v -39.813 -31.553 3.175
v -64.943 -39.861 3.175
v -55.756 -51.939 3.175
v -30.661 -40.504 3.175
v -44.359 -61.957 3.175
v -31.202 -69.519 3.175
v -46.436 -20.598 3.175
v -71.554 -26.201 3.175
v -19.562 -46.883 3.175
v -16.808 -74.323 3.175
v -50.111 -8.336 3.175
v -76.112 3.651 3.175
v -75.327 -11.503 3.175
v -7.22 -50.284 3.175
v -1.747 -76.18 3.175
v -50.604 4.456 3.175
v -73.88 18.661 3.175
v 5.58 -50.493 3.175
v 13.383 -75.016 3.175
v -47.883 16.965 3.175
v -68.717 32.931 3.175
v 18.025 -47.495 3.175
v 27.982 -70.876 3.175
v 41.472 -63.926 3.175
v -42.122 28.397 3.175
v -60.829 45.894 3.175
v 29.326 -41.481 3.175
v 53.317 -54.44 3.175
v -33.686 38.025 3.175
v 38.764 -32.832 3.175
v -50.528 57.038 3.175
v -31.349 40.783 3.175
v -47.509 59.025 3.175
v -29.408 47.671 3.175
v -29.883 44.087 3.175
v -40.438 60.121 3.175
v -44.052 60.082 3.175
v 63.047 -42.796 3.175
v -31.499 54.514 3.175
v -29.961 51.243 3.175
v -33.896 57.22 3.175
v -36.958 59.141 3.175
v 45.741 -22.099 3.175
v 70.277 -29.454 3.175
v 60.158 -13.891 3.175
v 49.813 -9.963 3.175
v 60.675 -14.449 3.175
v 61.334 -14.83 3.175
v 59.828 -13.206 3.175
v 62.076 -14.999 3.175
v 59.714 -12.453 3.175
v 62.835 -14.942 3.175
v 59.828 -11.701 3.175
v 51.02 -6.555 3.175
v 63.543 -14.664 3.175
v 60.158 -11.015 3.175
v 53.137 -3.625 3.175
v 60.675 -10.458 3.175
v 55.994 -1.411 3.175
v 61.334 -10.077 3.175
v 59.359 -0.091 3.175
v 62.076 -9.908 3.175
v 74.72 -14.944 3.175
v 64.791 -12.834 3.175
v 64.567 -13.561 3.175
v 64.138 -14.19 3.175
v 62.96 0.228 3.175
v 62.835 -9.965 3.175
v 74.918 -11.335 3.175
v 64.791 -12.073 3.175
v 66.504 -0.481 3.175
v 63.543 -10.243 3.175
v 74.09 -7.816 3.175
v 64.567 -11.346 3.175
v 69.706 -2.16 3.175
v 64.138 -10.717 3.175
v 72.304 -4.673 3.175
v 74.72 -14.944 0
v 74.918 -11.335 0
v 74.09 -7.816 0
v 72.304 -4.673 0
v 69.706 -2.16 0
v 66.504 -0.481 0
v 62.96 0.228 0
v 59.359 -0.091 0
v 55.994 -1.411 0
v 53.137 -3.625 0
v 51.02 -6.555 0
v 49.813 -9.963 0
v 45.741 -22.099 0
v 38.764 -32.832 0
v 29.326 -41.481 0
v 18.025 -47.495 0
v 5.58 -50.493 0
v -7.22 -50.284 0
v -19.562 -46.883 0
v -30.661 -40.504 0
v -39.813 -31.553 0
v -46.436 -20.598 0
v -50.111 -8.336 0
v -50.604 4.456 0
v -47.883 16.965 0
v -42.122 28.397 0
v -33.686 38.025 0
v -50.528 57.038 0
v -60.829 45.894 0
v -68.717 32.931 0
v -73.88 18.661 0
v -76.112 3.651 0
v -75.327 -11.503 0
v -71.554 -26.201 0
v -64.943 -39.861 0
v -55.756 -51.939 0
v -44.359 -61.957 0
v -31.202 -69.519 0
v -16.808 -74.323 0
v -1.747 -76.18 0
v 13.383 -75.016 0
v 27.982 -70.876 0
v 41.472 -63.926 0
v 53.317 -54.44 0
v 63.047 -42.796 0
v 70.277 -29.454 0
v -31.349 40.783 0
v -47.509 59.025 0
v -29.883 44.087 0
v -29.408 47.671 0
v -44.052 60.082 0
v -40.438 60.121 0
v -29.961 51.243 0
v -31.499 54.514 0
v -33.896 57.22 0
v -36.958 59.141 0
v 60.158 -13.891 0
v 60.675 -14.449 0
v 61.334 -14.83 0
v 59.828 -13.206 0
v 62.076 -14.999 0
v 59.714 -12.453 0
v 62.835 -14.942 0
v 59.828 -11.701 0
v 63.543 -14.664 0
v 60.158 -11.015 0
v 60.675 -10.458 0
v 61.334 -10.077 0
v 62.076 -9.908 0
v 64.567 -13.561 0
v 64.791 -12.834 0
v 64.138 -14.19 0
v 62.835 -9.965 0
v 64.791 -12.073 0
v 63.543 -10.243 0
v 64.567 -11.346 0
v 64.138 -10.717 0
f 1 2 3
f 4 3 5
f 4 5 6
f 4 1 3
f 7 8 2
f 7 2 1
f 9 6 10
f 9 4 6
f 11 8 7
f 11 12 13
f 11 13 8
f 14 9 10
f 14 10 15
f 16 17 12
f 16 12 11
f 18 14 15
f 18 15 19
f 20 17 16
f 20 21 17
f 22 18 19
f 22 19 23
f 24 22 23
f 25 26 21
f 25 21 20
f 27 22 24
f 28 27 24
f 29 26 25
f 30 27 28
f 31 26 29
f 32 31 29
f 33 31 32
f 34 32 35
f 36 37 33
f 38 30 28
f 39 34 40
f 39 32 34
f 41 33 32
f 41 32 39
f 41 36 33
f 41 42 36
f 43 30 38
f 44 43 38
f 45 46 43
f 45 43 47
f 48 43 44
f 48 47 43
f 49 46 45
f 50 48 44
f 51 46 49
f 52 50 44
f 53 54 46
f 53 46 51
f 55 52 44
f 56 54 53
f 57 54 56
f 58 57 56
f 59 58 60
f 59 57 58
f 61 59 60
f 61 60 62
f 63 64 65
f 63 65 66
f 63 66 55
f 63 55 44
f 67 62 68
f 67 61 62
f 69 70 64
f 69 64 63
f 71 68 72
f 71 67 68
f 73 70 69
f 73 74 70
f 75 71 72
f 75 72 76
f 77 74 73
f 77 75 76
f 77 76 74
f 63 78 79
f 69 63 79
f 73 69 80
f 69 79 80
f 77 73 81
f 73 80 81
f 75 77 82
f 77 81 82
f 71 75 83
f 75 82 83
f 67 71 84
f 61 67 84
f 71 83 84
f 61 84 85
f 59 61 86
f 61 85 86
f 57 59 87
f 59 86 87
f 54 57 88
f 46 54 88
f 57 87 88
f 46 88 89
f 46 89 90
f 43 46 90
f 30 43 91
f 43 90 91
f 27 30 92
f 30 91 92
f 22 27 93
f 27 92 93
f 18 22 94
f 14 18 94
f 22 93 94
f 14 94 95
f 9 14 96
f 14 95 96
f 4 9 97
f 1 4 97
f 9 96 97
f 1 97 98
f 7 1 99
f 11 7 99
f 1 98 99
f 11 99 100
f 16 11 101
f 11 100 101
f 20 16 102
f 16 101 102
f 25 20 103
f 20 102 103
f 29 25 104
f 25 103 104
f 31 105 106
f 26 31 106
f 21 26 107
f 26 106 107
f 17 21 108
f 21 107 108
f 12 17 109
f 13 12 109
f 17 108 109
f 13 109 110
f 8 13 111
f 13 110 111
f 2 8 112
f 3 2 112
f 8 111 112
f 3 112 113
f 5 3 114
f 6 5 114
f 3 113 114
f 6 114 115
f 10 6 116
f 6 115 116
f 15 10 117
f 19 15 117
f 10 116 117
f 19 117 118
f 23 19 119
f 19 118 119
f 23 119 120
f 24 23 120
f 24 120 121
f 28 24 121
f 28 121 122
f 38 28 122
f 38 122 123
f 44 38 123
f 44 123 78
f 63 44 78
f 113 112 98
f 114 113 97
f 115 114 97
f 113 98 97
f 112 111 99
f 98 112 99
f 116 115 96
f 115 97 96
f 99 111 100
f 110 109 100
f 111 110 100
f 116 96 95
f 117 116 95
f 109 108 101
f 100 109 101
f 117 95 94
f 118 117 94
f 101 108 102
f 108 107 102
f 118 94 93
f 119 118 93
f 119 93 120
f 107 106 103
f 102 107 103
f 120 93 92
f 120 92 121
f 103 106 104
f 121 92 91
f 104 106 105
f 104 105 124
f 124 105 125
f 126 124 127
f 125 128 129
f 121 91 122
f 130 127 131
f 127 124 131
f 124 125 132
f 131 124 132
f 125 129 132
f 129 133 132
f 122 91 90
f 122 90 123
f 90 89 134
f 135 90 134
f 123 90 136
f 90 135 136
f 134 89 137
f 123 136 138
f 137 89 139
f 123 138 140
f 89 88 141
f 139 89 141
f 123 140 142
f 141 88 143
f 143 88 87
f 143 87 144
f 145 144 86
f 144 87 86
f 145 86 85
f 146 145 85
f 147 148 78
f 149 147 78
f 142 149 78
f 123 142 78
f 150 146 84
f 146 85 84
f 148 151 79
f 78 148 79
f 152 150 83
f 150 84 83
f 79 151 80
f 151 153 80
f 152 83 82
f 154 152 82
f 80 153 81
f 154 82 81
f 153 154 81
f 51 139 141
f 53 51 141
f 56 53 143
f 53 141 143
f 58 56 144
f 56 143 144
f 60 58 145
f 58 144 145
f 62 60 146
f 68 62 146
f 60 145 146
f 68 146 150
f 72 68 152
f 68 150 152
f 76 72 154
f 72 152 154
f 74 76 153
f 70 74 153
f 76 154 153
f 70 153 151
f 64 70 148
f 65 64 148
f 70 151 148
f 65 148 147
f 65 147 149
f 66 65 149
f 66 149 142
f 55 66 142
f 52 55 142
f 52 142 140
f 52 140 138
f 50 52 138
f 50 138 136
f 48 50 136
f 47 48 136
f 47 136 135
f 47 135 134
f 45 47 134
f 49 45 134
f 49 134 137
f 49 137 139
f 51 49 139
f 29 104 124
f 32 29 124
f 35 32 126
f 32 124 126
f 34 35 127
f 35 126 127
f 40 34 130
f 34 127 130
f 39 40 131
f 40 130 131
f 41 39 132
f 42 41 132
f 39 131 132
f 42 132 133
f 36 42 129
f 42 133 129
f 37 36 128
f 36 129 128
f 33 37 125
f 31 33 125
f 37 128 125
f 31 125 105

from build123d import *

# Parameters (mm, degrees)
BOSS_EXTRUDE1_DEPTH     = 3.175
F_1_4_20_TAPPED_HOLE1_D = 5.1054


with BuildPart() as part:
    # Sketch1 → Boss-Extrude1 (new body)
    with BuildSketch(Plane.XY):
        with BuildLine():
            ThreePointArc((-50.528450834, 57.037844072), (-37.969184963, -66.066489185), (74.720247488, -14.944049498))
            ThreePointArc((74.720247488, -14.944049498), (64.757547823, 0), (49.813498325, -9.962699665))
            ThreePointArc((49.813498325, -9.962699665), (-25.312789976, -44.044326123), (-33.685633889, 38.025229381))
            ThreePointArc((-33.685633889, 38.025229381), (-32.600735016, 55.952945199), (-50.528450834, 57.037844072))
        make_face()
    extrude(amount=BOSS_EXTRUDE1_DEPTH)

    # 1/4-20 Tapped Hole1 (through all)
    with Locations(Plane.XY.offset(3.175)):
        with Locations((62.266872906, -12.453374581)):
            Hole(F_1_4_20_TAPPED_HOLE1_D / 2)


solid = part.part
